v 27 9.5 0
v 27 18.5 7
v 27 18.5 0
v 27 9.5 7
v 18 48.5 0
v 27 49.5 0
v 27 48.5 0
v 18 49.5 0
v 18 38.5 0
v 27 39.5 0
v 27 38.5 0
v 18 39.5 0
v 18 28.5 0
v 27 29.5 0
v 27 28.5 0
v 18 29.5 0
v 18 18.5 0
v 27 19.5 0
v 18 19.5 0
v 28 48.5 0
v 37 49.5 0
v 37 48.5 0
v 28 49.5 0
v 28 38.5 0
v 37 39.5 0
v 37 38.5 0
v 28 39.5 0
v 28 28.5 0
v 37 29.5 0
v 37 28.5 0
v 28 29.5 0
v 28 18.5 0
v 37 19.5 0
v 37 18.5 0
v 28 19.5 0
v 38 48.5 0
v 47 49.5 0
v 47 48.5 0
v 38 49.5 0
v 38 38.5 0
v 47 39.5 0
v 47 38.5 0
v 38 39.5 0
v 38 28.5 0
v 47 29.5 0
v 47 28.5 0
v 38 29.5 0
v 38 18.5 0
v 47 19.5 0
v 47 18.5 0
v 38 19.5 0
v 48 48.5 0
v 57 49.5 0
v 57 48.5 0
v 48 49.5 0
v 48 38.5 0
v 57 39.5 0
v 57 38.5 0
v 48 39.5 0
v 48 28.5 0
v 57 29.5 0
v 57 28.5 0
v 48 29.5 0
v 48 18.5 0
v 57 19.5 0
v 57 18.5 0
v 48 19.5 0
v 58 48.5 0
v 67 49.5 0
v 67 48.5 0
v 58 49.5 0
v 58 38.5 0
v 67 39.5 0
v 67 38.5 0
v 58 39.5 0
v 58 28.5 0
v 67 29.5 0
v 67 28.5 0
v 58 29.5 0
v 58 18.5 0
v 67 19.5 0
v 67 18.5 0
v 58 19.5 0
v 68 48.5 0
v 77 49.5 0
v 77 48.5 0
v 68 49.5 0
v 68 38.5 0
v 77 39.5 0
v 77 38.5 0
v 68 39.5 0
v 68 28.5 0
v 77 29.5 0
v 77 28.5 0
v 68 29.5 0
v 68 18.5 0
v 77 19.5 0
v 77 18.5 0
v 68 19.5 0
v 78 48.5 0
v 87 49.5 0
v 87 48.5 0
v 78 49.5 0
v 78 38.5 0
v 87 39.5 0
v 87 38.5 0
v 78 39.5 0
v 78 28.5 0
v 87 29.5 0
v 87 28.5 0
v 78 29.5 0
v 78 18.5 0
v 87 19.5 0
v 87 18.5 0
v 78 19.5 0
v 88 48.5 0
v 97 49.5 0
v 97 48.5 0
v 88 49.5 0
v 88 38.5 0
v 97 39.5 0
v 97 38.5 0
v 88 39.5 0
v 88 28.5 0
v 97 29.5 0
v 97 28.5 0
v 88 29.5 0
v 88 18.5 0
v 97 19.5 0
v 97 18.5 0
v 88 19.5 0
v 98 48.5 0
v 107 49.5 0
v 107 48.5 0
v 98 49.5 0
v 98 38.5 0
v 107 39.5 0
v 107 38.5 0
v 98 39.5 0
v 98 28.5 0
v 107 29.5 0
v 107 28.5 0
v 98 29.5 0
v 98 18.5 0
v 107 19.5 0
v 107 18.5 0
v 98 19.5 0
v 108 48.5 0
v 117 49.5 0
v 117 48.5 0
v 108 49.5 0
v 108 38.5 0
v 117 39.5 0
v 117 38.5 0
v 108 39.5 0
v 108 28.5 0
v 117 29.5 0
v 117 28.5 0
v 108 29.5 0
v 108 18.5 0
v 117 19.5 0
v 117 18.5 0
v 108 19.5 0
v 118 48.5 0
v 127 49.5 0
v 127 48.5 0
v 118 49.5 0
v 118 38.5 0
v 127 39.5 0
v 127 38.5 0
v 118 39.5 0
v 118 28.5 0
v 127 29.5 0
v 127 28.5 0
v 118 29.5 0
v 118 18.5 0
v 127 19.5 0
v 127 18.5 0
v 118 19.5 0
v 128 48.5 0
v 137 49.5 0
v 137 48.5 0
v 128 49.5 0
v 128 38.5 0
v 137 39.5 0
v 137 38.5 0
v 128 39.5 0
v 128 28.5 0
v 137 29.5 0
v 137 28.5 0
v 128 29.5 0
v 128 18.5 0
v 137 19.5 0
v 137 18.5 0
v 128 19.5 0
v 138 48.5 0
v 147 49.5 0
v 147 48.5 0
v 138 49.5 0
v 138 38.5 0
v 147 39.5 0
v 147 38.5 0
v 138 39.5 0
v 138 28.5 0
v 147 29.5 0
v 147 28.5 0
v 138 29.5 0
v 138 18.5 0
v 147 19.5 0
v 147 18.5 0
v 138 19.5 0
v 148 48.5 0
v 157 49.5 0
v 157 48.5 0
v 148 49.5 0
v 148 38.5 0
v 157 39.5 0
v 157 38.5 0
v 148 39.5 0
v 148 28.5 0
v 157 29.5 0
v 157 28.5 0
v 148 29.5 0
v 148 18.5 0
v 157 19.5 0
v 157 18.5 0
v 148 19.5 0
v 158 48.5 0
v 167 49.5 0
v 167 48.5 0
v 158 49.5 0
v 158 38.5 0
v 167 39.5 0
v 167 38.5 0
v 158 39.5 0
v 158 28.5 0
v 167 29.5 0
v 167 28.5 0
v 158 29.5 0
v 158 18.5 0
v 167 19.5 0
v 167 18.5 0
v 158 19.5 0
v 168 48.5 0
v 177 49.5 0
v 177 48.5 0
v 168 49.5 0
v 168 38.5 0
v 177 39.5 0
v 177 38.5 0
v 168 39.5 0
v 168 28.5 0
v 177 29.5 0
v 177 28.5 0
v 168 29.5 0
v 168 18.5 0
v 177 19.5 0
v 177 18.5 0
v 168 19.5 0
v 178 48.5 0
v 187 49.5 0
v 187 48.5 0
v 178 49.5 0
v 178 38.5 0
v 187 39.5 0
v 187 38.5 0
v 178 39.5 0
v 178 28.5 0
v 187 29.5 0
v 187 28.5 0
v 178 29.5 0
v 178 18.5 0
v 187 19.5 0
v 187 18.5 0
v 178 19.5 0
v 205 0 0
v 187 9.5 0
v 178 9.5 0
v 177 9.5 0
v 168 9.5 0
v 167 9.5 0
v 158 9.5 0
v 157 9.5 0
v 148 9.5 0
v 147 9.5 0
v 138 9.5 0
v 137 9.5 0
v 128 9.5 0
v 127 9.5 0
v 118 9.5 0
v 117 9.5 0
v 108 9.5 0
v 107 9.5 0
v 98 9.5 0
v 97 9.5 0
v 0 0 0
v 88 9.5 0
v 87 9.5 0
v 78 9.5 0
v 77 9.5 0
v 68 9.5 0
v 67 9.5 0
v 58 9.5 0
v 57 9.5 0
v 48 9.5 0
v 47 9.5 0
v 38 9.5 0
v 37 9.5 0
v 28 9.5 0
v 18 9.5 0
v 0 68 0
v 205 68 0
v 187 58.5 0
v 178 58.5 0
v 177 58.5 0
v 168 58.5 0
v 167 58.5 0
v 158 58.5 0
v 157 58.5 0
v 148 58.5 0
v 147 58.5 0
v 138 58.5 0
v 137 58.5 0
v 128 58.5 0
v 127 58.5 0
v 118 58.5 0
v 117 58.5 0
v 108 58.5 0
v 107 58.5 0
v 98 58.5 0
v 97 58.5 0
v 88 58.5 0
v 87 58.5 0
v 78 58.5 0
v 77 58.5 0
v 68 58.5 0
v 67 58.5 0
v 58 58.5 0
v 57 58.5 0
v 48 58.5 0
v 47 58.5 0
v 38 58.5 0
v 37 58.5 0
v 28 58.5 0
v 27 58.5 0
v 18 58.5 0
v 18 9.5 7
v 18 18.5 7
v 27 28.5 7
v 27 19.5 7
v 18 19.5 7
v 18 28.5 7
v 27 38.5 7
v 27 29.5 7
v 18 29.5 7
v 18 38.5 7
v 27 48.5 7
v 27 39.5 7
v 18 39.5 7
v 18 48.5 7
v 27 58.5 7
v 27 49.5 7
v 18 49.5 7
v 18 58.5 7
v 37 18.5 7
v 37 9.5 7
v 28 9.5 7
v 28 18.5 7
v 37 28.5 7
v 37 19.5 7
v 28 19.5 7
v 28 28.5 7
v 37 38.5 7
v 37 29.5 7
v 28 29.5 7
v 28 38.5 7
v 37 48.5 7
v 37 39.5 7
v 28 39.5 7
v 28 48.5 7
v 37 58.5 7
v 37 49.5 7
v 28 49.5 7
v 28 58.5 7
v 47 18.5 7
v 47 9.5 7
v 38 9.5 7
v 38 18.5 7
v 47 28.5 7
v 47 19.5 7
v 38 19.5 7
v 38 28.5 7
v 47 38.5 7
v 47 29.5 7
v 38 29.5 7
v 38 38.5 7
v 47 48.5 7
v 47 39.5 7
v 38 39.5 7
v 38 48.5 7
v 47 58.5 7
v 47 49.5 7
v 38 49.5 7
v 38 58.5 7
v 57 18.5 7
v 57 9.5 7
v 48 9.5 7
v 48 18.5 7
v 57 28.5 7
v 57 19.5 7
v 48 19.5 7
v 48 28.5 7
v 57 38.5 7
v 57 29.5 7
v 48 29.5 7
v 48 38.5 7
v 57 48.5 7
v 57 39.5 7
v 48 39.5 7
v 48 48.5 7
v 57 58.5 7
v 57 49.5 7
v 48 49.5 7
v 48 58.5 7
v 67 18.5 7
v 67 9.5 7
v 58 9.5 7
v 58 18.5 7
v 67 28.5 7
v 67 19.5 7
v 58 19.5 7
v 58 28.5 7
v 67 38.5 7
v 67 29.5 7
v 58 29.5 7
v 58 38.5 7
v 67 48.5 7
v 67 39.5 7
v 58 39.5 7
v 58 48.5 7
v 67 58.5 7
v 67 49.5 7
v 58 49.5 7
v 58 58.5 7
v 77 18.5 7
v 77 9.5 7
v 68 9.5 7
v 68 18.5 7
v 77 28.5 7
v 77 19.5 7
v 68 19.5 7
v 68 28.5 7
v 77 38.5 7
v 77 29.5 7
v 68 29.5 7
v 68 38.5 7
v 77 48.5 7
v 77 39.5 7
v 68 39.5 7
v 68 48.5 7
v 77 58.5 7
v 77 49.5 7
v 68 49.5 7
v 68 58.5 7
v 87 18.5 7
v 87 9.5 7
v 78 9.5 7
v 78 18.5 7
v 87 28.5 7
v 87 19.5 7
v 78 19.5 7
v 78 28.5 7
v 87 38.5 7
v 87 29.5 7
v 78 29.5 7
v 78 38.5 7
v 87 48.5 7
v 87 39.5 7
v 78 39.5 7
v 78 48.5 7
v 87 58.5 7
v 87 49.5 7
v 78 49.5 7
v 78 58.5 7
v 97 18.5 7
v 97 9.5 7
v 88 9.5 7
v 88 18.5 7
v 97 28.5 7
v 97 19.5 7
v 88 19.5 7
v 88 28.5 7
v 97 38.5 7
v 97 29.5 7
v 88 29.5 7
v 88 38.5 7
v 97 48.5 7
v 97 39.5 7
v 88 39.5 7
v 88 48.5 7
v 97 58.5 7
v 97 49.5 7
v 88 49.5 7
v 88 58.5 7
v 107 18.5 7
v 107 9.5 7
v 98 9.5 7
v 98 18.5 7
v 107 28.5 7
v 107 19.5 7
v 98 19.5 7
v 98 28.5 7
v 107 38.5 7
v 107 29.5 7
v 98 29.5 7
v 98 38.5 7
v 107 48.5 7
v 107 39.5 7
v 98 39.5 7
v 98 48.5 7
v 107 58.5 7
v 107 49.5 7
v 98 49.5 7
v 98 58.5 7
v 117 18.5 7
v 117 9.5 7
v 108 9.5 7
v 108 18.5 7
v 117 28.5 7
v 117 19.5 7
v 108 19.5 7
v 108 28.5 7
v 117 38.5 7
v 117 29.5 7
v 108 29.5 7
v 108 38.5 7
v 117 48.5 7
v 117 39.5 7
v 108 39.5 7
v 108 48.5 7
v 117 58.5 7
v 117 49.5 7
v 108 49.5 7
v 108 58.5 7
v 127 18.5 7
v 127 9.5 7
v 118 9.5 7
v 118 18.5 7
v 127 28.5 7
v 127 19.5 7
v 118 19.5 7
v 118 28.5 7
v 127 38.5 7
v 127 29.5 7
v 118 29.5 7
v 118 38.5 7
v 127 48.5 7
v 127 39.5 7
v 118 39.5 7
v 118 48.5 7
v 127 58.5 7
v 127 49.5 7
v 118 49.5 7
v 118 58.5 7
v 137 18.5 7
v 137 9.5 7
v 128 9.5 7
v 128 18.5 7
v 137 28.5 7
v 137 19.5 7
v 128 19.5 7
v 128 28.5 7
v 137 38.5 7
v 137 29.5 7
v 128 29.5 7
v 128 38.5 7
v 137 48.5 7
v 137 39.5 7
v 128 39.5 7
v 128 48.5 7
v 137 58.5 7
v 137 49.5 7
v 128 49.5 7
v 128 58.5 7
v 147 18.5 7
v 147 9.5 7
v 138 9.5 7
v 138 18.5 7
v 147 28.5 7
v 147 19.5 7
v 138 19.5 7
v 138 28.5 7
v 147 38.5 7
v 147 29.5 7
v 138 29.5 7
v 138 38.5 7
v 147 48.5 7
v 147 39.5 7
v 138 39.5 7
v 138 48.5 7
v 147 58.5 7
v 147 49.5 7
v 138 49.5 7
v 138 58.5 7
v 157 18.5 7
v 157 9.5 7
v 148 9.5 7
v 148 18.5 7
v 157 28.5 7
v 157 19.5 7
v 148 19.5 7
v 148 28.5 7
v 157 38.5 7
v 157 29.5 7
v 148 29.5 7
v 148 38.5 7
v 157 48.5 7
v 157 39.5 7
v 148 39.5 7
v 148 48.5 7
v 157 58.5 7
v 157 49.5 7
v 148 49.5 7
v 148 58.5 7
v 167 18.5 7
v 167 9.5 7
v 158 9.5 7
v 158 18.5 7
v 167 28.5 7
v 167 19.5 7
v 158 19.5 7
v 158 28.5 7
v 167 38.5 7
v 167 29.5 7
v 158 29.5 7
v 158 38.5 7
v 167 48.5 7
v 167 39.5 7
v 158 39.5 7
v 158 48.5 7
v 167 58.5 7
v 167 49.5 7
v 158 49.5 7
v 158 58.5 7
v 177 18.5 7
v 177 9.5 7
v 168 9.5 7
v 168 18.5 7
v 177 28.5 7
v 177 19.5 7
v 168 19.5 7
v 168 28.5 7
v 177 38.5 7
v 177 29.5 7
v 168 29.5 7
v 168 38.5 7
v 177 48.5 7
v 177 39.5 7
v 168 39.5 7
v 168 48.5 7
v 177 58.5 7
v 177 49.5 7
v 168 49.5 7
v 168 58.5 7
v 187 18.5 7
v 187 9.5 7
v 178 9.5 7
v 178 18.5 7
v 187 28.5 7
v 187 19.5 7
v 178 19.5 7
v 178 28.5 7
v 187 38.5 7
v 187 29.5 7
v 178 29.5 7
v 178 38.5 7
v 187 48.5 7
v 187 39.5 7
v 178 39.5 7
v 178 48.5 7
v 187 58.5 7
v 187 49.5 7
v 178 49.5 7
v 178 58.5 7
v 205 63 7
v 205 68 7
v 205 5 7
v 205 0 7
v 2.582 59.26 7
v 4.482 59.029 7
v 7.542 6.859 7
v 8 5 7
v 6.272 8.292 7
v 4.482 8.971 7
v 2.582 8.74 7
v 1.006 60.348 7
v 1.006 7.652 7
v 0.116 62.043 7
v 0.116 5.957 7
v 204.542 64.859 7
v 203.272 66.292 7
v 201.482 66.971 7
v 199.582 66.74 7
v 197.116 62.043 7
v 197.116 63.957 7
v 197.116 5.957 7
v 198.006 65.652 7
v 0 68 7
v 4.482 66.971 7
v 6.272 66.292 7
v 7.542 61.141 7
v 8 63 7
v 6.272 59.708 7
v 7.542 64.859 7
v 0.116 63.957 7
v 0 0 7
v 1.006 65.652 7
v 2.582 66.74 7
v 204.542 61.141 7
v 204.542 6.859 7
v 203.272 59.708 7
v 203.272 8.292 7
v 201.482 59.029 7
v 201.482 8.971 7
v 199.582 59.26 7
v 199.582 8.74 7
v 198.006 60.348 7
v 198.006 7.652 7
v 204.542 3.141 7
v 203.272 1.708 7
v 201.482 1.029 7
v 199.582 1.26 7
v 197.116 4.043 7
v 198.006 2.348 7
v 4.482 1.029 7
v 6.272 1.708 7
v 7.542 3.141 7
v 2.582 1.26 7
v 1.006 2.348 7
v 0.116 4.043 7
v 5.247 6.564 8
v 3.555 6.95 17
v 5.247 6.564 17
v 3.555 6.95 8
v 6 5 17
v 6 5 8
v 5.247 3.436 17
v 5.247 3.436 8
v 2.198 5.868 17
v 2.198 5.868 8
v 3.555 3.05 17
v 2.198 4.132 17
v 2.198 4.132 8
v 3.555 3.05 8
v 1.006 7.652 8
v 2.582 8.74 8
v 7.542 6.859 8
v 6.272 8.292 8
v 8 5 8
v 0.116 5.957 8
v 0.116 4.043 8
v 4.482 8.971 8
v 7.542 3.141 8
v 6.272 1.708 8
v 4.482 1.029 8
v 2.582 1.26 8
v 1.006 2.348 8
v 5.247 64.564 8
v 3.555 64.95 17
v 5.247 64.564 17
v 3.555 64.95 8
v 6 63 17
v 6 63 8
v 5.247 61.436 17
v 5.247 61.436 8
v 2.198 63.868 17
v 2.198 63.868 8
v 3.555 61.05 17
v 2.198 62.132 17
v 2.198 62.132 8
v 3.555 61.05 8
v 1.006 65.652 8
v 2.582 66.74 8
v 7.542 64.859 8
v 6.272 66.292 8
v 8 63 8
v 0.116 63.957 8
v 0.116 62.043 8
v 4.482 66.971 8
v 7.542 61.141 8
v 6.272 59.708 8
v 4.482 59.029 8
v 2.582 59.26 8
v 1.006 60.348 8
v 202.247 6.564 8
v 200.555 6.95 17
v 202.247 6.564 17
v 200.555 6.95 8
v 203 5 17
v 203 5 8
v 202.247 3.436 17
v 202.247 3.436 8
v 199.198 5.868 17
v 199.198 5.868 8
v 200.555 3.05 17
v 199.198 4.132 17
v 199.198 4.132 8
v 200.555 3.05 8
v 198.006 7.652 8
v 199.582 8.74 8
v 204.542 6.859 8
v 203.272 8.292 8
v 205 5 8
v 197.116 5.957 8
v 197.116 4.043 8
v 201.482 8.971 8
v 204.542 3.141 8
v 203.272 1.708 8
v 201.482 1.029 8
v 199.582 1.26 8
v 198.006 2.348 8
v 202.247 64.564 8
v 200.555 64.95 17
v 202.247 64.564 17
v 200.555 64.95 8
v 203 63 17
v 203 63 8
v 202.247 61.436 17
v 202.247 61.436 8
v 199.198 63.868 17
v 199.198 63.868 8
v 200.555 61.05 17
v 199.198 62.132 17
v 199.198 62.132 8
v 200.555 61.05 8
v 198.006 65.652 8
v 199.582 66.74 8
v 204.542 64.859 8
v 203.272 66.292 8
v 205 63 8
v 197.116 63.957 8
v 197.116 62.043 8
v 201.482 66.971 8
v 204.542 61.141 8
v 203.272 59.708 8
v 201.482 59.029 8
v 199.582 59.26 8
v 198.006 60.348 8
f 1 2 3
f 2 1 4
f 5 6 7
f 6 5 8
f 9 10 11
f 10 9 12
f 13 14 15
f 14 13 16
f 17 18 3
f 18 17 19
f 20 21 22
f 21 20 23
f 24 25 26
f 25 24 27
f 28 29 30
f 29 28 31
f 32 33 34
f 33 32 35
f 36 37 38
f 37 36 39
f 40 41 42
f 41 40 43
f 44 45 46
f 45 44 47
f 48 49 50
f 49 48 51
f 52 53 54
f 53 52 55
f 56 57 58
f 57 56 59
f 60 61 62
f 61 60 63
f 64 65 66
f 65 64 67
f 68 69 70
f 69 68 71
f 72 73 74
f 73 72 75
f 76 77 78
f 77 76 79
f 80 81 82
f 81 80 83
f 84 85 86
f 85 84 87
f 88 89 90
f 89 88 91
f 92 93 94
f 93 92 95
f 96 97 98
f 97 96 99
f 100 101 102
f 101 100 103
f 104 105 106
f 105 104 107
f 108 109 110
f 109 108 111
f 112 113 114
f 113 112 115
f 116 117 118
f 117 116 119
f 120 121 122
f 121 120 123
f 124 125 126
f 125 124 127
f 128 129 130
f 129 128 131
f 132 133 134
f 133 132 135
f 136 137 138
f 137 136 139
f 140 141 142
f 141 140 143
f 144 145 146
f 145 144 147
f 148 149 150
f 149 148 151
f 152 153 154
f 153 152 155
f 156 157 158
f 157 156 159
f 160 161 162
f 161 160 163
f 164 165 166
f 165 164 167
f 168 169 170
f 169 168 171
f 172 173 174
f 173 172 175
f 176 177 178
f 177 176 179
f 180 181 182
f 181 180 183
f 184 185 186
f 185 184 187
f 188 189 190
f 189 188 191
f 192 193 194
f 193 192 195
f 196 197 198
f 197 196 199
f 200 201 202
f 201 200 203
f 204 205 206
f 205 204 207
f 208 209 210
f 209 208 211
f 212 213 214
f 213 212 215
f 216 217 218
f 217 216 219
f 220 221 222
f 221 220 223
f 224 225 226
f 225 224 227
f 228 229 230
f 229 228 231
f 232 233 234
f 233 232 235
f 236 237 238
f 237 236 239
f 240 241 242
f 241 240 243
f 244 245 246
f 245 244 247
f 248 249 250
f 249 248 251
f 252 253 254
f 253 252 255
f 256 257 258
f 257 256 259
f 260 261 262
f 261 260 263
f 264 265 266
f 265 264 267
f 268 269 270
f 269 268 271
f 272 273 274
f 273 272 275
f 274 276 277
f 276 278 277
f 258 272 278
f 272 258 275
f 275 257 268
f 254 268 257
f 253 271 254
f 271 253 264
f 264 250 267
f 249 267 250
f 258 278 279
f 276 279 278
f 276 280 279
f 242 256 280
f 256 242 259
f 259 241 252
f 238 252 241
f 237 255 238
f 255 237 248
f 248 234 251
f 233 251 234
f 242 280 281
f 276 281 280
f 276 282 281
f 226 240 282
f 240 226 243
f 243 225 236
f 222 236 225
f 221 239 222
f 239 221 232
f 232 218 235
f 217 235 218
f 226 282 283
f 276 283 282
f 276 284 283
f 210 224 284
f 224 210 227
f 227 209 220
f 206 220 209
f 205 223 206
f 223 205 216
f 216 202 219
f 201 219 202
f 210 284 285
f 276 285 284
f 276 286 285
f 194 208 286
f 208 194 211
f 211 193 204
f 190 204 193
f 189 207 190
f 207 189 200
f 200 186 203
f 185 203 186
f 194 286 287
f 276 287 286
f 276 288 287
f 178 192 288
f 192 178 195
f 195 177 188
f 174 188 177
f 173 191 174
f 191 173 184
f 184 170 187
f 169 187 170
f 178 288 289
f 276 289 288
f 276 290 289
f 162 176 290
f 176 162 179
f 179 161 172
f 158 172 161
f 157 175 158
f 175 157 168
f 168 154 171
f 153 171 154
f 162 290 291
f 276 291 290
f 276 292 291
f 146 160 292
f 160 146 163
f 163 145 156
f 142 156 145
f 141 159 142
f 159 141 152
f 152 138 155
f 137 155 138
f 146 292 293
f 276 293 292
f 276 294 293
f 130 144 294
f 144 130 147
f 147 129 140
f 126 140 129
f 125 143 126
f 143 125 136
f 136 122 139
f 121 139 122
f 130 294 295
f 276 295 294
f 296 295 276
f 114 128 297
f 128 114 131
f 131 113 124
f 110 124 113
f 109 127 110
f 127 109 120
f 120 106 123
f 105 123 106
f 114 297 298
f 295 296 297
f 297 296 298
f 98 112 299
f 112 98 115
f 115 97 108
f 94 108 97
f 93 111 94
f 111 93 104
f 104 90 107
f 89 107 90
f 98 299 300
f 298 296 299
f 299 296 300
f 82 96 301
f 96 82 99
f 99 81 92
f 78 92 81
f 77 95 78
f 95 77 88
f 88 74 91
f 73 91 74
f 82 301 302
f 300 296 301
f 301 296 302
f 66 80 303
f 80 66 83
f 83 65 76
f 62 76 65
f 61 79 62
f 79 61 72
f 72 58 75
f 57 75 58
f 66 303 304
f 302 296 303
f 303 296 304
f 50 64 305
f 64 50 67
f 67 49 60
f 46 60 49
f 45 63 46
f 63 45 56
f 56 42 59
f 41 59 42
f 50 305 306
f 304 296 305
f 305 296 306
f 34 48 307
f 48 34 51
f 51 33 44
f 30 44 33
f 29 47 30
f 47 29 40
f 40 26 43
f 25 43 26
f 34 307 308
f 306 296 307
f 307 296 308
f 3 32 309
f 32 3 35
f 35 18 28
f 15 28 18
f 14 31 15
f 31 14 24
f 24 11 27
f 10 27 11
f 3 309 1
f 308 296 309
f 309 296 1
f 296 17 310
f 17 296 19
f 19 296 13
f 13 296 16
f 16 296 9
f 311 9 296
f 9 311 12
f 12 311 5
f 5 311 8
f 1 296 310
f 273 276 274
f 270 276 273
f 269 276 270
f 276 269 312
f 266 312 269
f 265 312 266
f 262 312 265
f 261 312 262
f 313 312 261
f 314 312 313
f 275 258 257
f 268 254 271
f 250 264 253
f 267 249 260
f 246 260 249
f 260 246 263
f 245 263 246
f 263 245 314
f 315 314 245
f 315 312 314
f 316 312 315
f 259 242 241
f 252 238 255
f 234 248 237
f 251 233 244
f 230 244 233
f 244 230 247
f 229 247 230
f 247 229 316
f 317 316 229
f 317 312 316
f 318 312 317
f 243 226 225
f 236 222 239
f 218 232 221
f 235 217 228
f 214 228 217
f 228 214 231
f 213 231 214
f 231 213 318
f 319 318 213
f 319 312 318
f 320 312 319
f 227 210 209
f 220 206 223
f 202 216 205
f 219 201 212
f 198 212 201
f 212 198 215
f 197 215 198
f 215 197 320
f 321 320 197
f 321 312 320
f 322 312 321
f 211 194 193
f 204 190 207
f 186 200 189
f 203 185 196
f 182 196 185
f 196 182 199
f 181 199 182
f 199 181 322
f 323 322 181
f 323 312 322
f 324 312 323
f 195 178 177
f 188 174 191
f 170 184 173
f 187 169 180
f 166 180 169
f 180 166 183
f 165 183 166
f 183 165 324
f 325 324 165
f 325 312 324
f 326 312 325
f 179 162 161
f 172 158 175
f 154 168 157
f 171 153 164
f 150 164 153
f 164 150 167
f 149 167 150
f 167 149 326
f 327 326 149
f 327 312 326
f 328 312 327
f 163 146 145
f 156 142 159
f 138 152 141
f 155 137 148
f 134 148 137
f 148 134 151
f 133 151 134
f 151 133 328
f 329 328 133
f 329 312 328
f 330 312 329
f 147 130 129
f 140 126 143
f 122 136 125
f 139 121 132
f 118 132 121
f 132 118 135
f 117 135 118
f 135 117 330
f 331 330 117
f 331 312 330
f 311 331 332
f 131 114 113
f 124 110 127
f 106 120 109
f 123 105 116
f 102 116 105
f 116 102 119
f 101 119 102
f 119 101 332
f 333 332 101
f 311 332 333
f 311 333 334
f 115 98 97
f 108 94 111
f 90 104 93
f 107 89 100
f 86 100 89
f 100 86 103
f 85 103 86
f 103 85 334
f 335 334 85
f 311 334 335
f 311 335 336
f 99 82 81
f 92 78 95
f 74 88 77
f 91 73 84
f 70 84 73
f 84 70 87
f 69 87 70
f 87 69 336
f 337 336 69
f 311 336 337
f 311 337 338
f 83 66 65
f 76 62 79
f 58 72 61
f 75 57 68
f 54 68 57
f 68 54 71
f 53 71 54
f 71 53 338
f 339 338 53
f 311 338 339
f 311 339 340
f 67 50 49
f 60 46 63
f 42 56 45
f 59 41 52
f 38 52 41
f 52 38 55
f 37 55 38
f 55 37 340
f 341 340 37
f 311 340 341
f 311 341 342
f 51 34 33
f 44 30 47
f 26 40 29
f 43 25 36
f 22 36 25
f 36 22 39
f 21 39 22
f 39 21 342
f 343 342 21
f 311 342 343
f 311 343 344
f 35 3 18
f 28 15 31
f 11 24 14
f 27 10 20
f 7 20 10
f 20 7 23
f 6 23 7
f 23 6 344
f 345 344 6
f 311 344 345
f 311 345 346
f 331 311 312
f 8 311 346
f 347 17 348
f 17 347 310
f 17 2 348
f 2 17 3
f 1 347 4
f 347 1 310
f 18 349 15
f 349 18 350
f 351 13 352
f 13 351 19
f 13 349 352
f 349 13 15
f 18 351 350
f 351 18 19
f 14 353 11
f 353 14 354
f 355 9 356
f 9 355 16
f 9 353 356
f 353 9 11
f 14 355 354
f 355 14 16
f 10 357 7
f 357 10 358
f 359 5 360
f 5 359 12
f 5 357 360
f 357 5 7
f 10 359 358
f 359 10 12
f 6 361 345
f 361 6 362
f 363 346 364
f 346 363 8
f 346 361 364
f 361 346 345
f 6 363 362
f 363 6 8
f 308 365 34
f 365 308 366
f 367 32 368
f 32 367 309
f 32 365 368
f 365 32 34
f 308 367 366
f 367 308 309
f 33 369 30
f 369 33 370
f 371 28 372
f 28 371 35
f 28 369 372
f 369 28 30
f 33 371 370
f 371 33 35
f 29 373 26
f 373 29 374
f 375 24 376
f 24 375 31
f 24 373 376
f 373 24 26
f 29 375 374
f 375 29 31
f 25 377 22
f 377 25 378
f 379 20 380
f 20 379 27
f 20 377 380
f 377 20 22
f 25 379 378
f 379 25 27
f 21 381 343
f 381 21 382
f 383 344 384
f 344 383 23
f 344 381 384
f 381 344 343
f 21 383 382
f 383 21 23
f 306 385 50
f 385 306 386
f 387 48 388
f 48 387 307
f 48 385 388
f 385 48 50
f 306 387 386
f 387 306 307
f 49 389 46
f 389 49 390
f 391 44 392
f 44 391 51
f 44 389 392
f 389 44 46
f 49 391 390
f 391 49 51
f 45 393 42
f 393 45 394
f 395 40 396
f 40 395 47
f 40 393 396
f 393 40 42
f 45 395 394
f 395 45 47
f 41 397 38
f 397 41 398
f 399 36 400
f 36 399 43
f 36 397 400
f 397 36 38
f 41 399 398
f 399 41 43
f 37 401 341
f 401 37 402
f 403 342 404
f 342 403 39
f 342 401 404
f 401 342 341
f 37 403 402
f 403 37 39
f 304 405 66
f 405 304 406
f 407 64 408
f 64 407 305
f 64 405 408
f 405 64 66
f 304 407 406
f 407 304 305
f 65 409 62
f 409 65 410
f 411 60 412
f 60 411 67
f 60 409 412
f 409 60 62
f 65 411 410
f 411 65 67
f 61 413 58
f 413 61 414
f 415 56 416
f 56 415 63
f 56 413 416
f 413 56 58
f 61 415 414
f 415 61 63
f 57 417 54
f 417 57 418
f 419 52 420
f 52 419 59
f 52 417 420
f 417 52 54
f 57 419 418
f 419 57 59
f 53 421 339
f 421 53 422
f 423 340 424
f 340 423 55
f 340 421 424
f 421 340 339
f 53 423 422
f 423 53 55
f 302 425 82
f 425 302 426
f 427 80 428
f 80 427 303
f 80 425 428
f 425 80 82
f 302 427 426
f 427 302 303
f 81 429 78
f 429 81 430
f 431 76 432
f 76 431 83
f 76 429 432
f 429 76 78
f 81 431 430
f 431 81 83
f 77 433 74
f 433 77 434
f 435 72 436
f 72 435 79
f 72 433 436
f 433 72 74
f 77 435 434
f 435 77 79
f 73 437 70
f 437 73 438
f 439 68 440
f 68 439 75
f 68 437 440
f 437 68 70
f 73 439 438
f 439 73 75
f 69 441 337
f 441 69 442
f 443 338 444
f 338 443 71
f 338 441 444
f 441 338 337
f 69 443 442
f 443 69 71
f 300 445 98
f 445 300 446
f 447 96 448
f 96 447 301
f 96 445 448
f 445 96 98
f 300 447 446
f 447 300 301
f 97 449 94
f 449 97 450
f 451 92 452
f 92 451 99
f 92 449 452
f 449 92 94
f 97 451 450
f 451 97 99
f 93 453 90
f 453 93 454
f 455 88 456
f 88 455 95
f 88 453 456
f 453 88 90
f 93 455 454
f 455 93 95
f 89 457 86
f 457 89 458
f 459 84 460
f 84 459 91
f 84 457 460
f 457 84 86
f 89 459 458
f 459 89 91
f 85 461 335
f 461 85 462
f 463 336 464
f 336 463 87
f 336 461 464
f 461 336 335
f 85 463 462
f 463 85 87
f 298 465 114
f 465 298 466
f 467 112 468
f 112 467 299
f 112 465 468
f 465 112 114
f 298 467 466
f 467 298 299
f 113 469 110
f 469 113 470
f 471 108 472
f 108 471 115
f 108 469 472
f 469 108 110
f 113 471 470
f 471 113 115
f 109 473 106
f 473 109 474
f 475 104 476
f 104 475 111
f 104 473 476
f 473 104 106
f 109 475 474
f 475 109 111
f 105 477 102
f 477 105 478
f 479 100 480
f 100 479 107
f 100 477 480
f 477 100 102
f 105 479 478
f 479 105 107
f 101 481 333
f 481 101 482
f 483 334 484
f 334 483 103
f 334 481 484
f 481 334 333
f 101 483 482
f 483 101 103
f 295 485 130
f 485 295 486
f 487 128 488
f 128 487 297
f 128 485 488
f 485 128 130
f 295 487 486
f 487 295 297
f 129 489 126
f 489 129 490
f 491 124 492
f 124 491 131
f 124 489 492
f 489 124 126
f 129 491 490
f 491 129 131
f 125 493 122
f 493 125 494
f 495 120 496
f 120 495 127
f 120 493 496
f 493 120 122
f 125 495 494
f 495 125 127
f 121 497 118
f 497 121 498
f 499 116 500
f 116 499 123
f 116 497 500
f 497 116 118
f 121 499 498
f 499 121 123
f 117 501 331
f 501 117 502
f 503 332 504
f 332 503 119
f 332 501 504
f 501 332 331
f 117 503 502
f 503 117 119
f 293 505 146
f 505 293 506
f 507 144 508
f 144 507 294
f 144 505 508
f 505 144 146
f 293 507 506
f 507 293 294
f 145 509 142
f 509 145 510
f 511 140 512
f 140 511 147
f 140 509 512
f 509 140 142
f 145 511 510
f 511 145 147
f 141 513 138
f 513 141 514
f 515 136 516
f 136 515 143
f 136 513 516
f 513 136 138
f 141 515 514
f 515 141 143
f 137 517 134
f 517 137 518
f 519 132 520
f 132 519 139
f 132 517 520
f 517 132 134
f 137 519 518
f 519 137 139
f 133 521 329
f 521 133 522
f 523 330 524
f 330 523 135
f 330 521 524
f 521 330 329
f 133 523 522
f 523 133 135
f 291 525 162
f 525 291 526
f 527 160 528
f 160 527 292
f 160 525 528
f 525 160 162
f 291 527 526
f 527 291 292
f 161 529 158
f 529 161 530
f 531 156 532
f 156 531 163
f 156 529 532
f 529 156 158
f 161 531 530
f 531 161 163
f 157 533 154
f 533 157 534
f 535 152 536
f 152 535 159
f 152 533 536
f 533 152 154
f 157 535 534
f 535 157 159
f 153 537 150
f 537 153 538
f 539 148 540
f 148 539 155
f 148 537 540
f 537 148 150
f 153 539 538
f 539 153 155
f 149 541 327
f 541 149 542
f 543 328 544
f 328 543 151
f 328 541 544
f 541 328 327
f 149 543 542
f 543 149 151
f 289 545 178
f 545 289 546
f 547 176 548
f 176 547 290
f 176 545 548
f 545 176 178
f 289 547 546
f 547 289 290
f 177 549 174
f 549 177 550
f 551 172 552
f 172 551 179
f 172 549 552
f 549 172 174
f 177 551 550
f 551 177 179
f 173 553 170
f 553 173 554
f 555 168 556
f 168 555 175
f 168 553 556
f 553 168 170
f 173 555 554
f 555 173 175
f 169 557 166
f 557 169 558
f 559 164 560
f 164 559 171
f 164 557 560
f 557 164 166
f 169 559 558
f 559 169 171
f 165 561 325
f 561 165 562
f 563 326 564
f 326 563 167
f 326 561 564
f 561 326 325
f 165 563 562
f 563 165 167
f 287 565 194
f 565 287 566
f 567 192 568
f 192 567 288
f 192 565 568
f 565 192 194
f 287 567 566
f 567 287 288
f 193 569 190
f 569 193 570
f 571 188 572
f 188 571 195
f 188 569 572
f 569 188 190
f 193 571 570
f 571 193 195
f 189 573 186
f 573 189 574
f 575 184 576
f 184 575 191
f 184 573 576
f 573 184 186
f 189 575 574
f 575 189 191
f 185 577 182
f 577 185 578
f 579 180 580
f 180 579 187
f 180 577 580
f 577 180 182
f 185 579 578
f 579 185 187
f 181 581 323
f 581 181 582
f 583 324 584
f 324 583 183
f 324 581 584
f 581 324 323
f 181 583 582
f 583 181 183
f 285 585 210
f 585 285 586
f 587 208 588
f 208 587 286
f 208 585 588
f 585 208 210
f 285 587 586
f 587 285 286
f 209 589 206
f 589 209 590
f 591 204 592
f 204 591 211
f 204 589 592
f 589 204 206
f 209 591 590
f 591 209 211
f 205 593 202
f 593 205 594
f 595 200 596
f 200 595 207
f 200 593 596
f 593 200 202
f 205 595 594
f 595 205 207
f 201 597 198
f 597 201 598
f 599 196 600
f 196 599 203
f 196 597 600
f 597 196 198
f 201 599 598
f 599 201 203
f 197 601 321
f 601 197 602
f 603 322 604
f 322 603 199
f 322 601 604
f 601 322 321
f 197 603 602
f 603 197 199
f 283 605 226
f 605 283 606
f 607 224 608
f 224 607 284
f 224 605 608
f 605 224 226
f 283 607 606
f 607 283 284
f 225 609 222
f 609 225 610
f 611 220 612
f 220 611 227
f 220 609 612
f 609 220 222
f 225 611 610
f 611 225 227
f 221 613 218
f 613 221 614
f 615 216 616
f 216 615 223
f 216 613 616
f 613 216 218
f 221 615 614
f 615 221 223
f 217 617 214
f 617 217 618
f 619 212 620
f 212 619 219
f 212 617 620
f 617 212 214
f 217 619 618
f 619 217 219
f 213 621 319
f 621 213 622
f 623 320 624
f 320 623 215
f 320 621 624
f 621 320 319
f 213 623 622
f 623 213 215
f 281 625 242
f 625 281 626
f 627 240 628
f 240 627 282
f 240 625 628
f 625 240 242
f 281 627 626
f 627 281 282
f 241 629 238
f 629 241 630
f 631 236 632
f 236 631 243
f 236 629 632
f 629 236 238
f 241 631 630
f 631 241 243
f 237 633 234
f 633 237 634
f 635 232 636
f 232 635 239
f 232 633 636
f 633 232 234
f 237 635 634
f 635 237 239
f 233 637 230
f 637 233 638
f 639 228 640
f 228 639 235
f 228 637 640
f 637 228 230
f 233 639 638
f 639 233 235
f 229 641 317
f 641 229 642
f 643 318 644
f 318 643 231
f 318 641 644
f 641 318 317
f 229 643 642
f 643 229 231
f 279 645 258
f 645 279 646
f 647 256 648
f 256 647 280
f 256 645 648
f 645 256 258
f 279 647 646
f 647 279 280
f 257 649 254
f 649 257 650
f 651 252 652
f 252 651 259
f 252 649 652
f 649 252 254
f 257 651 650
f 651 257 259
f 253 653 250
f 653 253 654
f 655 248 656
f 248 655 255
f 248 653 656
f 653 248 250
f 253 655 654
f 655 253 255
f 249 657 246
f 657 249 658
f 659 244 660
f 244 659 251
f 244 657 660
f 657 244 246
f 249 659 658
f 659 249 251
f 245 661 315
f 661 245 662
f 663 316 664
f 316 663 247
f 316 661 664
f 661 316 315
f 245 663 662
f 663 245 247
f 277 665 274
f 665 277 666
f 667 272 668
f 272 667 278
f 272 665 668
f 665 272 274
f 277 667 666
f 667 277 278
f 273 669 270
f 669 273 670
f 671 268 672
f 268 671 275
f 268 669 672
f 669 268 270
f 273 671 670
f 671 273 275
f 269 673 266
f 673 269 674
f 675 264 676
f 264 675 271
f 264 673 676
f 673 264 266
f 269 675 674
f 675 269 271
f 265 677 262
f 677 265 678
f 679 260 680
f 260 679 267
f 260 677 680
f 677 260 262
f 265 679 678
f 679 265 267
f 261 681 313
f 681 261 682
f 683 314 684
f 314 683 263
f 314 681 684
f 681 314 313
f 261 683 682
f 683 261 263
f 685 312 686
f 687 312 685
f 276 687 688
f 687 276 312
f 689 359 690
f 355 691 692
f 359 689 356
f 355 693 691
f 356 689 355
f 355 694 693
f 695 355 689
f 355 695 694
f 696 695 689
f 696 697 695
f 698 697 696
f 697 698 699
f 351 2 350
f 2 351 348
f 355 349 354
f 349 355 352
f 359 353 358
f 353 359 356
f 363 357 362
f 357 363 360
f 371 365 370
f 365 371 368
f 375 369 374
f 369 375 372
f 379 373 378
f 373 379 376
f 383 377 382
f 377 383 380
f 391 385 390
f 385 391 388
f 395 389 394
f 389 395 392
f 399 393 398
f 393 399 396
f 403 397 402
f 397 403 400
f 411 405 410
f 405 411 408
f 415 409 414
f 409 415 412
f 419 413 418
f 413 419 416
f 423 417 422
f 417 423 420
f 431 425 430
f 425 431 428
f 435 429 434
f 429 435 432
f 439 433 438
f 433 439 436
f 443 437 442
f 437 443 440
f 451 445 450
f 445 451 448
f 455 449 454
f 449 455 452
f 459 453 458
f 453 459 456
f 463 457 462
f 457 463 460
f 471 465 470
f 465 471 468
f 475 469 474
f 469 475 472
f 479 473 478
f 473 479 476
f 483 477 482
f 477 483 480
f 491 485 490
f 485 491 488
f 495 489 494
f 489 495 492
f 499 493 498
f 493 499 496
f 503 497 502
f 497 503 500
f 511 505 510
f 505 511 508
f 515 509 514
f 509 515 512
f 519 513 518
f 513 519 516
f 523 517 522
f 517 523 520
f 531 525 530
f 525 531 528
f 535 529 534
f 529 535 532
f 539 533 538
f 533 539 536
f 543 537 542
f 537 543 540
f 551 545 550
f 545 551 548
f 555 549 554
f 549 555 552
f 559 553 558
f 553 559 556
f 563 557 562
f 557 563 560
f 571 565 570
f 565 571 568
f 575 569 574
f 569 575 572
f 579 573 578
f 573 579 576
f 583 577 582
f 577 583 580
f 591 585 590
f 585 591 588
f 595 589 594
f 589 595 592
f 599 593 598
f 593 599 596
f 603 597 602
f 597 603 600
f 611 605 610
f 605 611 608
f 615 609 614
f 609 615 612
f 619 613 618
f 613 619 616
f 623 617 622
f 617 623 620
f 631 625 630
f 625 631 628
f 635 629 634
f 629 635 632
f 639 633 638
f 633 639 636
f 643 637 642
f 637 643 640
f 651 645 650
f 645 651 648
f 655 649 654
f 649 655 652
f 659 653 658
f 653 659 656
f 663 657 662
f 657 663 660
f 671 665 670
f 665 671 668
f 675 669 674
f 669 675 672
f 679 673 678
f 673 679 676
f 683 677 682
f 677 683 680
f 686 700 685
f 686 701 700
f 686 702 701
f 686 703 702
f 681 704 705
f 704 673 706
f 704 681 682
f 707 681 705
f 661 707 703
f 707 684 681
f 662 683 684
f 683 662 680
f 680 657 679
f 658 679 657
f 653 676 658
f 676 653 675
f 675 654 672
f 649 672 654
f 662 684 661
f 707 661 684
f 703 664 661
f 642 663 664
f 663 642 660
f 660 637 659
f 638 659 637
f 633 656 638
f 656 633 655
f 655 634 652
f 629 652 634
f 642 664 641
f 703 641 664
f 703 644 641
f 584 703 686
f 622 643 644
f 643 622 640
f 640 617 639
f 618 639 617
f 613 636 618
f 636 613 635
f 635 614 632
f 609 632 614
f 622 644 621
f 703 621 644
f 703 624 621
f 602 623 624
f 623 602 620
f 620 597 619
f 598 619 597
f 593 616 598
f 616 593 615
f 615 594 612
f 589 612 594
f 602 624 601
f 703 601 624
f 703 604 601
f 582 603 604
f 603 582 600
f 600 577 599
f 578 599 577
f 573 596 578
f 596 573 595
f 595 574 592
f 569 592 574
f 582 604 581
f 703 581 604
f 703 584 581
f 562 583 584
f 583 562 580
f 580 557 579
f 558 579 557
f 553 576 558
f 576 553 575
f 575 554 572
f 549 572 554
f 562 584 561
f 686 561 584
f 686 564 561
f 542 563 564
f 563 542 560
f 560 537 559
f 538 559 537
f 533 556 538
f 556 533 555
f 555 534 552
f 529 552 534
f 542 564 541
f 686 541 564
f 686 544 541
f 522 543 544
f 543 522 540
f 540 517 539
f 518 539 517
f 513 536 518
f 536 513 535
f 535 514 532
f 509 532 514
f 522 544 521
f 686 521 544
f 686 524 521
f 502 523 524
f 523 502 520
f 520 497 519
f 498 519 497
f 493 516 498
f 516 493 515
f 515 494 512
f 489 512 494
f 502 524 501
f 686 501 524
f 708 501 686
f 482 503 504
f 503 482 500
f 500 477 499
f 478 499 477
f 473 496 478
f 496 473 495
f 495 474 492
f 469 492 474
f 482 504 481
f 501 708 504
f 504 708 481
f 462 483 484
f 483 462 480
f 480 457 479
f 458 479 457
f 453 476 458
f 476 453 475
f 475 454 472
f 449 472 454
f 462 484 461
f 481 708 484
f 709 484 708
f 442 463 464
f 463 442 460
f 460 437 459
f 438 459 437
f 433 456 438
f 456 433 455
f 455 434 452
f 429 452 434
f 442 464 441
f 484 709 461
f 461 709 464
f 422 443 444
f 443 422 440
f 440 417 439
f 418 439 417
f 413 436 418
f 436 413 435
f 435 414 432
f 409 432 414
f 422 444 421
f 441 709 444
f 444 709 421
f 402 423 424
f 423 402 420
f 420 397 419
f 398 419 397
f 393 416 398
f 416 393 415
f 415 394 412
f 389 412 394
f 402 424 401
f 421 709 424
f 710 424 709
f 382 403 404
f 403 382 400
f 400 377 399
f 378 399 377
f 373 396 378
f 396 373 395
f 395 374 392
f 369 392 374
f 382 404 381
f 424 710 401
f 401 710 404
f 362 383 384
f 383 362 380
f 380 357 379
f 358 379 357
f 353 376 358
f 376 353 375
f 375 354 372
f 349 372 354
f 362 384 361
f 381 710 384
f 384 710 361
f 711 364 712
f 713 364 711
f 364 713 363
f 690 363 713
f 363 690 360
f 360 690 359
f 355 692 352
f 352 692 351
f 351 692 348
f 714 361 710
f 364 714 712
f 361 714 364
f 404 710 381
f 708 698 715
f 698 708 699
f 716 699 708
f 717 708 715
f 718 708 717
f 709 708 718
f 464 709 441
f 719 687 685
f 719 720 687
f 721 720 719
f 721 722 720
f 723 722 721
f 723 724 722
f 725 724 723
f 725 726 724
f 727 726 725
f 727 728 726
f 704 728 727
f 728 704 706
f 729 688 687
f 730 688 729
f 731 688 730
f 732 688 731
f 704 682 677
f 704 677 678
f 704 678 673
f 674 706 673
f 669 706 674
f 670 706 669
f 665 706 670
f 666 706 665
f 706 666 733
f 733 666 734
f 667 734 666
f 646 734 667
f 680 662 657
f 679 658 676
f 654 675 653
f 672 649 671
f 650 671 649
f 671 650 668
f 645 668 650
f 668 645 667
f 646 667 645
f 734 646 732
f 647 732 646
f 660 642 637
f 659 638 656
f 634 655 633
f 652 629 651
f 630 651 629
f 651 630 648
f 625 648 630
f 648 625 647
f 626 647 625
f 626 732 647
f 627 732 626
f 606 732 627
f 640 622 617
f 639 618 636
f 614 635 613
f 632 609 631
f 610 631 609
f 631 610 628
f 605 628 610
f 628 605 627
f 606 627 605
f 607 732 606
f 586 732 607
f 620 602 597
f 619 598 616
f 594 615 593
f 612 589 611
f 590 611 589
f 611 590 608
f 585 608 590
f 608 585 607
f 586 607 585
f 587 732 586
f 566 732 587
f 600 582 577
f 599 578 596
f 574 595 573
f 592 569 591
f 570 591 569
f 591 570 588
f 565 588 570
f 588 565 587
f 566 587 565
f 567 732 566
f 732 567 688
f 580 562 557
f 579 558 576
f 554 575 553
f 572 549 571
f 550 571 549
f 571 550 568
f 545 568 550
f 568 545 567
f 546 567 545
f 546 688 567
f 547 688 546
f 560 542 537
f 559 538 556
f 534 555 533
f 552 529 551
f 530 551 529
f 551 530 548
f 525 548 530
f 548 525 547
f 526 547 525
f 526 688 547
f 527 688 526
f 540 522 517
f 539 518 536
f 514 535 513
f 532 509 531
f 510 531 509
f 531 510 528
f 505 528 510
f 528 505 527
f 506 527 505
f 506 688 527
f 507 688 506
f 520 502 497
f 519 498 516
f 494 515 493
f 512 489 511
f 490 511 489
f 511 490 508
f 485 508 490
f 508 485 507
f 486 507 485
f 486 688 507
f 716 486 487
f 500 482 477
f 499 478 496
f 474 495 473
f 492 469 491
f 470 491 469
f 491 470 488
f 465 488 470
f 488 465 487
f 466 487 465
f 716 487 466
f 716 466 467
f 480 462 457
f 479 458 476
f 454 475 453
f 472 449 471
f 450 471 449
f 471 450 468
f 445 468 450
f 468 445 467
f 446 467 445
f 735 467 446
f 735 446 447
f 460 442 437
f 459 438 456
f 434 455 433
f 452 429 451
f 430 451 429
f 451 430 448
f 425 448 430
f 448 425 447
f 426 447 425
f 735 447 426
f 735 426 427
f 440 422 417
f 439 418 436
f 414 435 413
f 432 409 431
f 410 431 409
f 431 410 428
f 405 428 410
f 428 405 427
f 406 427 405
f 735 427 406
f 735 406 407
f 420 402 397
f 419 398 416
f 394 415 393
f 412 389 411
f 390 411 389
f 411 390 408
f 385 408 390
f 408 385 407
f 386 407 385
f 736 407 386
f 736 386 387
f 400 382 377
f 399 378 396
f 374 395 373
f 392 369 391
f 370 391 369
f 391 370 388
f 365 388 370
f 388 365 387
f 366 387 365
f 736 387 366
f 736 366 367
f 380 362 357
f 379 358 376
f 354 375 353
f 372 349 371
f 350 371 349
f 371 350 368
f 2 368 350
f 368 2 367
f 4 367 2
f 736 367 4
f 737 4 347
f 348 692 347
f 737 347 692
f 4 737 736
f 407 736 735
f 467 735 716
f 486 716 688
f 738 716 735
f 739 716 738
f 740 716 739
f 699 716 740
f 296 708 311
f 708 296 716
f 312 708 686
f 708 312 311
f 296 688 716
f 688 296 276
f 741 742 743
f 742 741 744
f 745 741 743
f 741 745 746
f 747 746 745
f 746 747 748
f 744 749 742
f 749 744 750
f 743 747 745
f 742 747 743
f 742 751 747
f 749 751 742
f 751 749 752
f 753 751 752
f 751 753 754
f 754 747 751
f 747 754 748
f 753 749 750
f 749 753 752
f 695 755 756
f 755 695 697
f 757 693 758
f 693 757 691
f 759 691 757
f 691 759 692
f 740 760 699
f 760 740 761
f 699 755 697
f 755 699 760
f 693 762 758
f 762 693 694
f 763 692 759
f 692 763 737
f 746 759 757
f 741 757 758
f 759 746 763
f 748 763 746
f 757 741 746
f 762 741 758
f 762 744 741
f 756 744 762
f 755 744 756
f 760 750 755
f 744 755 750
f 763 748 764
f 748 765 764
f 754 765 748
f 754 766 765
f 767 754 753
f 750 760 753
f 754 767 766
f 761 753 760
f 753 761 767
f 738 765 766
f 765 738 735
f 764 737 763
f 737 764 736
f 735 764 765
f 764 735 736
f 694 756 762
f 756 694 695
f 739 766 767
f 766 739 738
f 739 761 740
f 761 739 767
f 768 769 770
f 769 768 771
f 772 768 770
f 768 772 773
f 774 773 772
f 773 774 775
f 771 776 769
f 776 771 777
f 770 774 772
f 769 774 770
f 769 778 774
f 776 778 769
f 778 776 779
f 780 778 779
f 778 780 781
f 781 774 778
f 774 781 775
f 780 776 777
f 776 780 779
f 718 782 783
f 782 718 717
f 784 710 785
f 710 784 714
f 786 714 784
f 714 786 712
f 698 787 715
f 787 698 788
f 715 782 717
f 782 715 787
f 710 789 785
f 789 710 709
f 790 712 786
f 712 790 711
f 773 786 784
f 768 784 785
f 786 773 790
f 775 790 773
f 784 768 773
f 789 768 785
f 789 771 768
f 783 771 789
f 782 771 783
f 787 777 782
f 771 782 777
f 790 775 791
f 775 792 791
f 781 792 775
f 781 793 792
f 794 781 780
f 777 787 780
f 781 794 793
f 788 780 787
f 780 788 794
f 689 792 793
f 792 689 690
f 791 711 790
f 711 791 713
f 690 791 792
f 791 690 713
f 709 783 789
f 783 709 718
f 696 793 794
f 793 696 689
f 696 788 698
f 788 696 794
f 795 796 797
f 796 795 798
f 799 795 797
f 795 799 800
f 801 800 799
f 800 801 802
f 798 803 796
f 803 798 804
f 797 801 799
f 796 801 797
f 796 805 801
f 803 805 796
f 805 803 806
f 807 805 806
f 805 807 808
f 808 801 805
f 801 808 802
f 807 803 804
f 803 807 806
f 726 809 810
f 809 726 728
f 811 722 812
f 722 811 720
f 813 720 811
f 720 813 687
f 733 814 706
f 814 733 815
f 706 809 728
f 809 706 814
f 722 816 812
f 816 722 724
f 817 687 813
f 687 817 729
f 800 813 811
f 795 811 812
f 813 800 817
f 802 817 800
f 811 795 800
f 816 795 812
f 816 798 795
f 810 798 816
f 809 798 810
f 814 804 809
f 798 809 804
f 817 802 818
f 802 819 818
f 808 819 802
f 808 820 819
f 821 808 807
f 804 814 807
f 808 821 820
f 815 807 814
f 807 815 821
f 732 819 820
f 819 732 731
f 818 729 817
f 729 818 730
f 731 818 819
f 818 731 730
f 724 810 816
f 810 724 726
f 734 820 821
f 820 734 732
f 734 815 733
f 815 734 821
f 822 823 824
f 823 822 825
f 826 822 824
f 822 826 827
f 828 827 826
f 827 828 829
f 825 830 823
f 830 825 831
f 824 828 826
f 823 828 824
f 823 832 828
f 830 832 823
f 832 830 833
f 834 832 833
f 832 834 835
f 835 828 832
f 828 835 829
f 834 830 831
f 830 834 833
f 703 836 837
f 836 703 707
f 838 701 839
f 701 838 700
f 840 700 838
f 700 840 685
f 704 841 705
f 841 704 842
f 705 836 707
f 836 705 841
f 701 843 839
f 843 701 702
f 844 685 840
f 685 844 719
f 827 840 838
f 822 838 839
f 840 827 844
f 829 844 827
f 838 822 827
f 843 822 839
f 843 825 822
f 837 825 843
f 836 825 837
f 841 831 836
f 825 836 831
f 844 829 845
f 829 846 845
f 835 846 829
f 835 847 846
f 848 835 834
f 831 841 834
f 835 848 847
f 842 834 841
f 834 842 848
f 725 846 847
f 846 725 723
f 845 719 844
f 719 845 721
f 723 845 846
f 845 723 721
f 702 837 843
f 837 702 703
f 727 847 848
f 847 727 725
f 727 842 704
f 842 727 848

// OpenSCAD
px = 205;
py = 68;
nx = 17;
ny = 5;
sl = 9;
cp = 10;

/*
translate([0,0,8]) {
difference() {
	cube([px,py,5]);
	translate([4,5,-2.5]) {
		cylinder(10,2,2);
	}
	translate([4,py-5,-2.5]) {
		cylinder(10,2,2);
	}
	translate([px-4,5,-2.5]) {
		cylinder(10,2,2);
	}
	translate([px-4,py-5,-2.5]) {
		cylinder(10,2,2);
	}
}
}
*/
translate([0,0,0]) {
	difference() {
		cube([px,py,7]);

		for (i = [0:nx-1]) {
			for (j = [0:ny-1]) {
				translate([i*cp + (px-((nx-1)*cp+sl))/2, j*cp + (py-((ny-1)*cp+sl))/2, 0]) {
					cube(sl,sl,10);
				}
				
			}	
		}
	}

	translate([4,5,7]) {
		union() {
			cylinder(10,2,2);
			cylinder(1,4,4);
		}
	}
	translate([4,py-5,7]) {
		union() {
			cylinder(10,2,2);
			cylinder(1,4,4);
		}
	}
	translate([px-4,5,7]) {
		union() {
			cylinder(10,2,2);
			cylinder(1,4,4);
		}
	}
	translate([px-4,py-5,7]) {
		union() {
			cylinder(10,2,2);
			cylinder(1,4,4);
		}
	}


}
